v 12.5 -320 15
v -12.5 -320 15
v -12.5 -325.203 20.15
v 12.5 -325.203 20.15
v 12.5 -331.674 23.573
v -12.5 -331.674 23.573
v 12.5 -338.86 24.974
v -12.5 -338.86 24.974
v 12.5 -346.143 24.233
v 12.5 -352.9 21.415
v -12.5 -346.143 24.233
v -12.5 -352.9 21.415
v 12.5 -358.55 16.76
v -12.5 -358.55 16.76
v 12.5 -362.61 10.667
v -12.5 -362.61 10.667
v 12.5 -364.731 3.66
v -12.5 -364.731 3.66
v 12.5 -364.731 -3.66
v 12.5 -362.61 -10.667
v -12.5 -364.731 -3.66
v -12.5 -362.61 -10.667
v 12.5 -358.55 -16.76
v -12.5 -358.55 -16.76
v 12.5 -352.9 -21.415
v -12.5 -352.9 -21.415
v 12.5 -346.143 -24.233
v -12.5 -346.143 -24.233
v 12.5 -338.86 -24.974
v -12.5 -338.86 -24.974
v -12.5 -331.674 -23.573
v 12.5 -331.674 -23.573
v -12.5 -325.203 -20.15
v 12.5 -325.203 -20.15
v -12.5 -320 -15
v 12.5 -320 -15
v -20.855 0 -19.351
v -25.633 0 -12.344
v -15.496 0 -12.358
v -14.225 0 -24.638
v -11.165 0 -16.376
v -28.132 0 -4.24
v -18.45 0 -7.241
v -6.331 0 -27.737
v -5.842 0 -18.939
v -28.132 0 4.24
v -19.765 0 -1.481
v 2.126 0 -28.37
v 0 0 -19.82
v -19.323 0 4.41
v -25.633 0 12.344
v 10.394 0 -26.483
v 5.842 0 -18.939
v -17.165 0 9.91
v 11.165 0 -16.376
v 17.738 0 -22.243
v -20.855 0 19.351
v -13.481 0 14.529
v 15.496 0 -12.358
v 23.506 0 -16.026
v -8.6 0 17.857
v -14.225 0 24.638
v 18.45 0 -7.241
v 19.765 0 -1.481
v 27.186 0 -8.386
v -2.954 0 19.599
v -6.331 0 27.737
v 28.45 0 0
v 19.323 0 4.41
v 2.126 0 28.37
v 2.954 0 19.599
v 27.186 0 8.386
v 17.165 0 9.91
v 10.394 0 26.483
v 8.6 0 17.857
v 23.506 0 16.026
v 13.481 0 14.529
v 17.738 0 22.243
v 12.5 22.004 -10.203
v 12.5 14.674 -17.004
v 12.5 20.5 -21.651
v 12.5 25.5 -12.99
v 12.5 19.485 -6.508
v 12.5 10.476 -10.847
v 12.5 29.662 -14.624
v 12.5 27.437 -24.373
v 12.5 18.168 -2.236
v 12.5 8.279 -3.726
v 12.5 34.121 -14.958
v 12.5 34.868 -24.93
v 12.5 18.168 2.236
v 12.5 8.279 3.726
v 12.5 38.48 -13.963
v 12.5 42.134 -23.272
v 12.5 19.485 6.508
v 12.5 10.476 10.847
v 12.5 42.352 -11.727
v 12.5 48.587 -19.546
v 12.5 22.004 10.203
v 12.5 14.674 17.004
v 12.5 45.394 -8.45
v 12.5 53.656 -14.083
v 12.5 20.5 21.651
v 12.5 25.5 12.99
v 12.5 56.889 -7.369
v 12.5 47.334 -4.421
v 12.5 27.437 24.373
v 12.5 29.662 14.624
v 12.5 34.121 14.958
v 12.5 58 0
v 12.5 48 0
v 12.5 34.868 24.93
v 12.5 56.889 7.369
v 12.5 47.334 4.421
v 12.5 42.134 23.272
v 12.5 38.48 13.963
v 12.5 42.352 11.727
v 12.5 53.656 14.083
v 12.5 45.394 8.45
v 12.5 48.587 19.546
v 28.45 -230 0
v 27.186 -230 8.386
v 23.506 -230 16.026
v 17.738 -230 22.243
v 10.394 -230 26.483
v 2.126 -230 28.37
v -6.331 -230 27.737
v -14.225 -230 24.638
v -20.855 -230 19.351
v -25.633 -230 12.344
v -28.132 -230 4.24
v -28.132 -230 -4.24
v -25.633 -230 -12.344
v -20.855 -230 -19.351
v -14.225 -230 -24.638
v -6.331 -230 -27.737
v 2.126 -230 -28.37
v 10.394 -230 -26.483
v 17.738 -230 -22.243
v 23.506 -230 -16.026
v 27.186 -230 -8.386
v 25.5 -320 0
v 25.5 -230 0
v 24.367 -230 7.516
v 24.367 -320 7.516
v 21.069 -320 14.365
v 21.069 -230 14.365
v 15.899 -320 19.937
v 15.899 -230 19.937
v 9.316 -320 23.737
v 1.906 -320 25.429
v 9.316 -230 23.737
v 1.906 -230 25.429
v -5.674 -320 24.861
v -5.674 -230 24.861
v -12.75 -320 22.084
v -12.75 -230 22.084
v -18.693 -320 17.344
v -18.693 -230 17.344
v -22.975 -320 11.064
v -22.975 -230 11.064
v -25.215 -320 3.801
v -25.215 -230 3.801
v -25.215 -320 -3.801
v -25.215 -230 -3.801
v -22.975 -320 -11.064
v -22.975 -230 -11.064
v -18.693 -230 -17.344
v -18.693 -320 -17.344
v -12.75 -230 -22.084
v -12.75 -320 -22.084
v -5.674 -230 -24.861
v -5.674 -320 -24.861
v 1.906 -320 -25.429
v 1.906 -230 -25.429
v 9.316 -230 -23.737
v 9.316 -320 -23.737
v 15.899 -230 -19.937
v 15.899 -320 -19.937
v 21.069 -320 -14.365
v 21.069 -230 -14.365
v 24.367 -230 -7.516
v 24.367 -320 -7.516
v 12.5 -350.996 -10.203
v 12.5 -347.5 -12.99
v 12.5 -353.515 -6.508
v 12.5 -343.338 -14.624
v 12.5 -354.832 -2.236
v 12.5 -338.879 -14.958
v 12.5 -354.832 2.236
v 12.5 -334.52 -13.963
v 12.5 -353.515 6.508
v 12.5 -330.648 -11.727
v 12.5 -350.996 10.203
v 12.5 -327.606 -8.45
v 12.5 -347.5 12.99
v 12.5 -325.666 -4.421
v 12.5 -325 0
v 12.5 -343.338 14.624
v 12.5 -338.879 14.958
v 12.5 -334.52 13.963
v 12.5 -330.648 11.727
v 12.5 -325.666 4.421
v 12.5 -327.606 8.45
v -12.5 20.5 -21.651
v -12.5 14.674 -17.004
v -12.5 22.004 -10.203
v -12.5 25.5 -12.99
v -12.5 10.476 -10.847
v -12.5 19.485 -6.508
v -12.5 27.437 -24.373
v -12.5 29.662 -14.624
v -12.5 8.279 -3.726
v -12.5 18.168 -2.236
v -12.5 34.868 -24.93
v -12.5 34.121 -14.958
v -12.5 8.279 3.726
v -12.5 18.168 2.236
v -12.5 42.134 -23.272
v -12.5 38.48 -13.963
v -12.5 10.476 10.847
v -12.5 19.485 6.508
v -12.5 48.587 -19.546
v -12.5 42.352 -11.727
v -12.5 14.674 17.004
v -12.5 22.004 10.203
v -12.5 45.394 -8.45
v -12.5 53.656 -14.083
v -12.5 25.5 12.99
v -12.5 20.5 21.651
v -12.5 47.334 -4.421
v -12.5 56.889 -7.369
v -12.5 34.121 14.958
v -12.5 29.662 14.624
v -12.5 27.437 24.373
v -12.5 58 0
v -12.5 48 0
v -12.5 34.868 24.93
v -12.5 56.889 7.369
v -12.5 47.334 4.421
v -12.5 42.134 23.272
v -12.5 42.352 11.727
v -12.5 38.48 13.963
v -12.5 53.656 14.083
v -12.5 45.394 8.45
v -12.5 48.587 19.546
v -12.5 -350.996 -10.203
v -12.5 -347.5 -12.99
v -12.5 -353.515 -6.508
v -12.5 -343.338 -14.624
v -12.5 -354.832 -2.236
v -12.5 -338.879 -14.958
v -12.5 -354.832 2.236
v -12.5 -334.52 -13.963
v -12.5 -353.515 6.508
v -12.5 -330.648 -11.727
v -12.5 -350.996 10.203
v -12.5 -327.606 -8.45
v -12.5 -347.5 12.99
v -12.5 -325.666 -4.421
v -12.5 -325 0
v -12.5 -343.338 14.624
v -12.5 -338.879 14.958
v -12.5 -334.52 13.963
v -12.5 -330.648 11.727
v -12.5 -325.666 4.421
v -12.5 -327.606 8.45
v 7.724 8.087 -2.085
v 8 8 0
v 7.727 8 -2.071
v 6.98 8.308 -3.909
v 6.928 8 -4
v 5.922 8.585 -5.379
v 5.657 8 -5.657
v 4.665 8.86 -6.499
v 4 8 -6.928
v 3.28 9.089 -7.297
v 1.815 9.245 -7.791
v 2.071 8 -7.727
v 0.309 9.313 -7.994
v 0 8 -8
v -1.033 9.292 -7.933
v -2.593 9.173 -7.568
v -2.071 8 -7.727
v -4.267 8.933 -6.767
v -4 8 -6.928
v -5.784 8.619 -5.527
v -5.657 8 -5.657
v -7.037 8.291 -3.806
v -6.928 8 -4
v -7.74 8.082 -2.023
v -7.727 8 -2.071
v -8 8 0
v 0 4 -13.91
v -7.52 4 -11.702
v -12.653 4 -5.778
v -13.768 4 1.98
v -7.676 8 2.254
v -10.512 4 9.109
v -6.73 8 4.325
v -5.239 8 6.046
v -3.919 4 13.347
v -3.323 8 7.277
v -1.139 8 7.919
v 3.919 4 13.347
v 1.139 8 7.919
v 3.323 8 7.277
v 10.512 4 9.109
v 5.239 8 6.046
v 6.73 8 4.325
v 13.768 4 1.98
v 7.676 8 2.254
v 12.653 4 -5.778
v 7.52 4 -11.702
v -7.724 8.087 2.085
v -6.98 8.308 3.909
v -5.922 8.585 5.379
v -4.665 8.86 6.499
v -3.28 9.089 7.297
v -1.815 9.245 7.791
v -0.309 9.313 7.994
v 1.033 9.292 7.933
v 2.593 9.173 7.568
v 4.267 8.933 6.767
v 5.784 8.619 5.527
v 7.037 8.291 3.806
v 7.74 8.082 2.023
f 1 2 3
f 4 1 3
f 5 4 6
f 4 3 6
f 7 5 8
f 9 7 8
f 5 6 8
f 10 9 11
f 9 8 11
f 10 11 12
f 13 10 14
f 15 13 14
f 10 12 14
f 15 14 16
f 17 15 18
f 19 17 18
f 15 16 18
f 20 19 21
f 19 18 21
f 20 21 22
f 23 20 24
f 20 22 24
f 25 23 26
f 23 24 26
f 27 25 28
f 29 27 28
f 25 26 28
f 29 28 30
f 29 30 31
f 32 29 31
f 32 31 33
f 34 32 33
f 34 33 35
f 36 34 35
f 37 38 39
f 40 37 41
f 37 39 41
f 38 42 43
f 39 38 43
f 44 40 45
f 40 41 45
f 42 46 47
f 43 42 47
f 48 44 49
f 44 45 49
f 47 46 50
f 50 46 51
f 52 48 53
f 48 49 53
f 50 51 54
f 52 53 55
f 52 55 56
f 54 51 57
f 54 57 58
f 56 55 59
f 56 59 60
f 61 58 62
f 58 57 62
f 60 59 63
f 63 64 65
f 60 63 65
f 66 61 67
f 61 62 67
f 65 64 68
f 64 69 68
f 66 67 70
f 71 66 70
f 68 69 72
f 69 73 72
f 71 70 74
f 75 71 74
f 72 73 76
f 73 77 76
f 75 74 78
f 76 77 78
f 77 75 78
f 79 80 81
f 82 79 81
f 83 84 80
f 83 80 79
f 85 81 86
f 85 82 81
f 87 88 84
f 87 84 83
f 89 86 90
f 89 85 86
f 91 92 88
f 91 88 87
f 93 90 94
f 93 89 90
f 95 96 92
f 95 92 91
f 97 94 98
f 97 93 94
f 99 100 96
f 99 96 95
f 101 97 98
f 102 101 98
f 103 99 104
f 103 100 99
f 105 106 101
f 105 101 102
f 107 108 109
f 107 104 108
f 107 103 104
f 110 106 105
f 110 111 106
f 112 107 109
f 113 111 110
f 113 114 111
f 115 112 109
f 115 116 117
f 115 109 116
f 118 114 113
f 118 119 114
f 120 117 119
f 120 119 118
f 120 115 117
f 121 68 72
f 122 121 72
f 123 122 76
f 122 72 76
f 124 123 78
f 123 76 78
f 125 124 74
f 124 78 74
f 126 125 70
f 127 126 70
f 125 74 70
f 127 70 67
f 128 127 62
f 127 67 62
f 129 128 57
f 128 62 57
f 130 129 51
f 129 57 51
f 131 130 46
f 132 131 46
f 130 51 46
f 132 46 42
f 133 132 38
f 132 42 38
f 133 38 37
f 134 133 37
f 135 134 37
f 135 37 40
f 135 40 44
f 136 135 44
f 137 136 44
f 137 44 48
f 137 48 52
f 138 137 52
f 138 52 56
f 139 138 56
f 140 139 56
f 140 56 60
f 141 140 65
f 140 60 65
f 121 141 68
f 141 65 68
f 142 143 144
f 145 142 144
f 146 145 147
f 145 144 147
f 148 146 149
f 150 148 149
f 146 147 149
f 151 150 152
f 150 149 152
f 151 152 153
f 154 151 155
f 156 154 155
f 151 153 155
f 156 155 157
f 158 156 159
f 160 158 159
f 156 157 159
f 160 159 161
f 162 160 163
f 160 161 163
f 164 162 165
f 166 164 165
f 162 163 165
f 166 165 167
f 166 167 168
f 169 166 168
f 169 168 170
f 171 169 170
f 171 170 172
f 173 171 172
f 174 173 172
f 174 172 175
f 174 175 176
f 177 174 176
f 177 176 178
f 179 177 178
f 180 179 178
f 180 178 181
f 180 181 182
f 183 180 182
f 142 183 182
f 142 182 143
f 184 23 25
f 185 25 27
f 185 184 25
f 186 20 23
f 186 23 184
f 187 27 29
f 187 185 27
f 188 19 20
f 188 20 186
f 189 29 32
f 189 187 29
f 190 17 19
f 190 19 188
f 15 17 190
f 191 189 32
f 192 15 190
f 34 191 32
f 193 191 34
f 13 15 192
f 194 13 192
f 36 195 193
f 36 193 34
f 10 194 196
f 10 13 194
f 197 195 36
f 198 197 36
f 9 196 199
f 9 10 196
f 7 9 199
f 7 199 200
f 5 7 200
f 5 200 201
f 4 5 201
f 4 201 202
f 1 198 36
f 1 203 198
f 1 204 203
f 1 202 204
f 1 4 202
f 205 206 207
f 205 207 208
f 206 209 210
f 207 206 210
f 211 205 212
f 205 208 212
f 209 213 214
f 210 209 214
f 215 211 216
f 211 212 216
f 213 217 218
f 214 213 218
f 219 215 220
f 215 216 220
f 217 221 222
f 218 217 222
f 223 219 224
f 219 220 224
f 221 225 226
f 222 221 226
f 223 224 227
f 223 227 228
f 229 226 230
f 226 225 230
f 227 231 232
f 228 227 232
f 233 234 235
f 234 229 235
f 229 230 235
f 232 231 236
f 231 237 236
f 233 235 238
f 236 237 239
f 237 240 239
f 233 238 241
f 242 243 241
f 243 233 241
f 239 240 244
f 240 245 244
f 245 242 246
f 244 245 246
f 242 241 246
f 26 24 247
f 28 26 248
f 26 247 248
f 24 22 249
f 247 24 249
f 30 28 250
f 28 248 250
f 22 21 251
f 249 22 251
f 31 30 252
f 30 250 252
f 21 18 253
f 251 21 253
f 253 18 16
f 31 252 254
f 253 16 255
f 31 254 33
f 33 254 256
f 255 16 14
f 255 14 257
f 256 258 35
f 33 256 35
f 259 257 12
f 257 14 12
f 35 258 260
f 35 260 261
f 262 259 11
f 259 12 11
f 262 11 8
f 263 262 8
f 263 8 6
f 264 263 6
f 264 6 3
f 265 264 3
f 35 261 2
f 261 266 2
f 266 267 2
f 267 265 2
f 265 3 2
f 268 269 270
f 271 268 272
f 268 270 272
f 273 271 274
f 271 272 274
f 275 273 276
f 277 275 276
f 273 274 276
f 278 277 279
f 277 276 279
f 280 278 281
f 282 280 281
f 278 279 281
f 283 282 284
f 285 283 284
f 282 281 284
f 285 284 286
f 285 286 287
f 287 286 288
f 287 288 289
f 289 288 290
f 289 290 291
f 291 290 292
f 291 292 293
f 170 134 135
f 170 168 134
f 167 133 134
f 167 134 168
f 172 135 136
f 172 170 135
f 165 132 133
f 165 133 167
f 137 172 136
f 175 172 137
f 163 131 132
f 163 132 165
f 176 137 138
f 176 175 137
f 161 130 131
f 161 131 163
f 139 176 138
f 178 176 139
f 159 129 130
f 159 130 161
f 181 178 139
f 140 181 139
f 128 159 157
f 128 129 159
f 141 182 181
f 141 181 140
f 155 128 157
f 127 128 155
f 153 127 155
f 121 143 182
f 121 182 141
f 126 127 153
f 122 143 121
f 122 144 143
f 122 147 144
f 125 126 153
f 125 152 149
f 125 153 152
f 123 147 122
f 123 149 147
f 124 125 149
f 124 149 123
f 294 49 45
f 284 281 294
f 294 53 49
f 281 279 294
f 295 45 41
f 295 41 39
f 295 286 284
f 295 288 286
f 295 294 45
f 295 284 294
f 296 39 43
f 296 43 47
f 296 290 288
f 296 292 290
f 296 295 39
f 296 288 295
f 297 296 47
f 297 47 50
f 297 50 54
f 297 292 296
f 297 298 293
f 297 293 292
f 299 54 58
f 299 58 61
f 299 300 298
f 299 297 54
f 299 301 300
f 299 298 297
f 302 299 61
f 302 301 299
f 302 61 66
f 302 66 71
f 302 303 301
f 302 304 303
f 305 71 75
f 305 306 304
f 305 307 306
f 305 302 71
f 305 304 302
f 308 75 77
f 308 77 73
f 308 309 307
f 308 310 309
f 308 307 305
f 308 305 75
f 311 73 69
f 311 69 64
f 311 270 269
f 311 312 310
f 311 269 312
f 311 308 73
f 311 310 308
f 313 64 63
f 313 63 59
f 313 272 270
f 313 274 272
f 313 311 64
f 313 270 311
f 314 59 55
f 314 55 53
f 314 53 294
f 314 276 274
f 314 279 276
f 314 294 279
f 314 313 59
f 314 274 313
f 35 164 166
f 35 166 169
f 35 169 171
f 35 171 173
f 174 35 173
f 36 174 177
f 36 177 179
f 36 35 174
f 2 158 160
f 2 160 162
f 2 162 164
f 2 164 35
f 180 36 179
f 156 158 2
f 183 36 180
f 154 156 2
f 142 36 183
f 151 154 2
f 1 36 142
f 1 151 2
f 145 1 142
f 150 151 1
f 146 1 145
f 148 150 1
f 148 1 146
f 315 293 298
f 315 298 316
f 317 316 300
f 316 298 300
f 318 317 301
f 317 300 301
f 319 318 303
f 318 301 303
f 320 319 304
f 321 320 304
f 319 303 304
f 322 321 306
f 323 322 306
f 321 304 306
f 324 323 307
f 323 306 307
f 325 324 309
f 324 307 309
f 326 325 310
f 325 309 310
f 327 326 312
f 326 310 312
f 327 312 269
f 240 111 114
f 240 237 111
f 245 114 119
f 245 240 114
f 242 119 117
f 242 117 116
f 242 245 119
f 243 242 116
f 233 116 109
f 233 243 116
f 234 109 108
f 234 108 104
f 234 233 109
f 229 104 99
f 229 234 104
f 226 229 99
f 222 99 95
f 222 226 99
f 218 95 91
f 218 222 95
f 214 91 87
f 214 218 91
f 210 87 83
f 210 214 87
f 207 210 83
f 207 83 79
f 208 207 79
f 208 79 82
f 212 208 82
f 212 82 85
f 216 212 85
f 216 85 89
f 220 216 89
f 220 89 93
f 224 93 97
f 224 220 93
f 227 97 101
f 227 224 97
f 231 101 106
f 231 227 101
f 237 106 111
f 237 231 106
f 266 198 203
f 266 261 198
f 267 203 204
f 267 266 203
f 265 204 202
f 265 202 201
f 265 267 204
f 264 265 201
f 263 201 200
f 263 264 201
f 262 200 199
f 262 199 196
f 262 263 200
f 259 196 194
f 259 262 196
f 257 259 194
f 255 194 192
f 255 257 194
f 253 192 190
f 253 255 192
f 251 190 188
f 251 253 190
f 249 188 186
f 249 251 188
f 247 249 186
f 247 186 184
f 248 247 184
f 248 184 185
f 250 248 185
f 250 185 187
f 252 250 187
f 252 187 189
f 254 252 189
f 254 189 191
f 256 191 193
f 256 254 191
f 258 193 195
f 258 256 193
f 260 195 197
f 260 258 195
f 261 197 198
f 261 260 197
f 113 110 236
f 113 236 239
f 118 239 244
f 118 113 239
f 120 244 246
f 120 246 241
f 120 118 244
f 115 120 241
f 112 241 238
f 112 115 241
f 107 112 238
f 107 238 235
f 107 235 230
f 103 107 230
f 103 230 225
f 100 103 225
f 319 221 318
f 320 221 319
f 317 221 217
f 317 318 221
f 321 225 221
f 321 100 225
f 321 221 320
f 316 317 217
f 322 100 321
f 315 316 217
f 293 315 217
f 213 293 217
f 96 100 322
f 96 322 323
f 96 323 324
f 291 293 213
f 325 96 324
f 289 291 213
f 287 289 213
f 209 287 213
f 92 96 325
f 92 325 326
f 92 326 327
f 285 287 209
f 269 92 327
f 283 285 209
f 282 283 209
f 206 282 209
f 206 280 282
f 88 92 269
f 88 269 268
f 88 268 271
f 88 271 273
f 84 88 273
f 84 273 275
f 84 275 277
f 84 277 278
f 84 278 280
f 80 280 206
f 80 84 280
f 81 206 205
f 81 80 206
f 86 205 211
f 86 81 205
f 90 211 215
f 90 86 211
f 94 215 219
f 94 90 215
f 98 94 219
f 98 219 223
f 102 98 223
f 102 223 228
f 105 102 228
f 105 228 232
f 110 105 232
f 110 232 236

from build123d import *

# Parameters (mm, degrees)
F0_R      = 28.45
F1_DEPTH  = 230
F2_R      = 25.5
F3_DEPTH  = 90
F8_R      = 8
F9_DEPTH  = 5
F11_R     = 25
F11_R_2   = 15
F12_DEPTH = 12.5


with BuildPart() as f1:
    # F0 (on Front) → F1 (new body)
    with BuildSketch(Plane.XZ):
        Circle(F0_R)
    extrude(amount=F1_DEPTH)

    # F2 (on face) → F3 (join)
    with BuildSketch(Plane.XZ.offset(230)):
        Circle(F2_R)
    extrude(amount=F3_DEPTH)

    # F4 (on Right) → F5 (revolve)
    with BuildSketch(Plane.YZ):
        Polygon((-285, -21.45), (-285, 0), (-320, 0), (-320, -25.5), align=None)
    revolve(axis=Axis((0, -302.5, 0), (0, 1, 0)))

    # F6 (on Right) → F7 (revolve)
    with BuildSketch(Plane.YZ):
        Polygon((8, 0), (0, 0), (0, -19.82), (8, -8), align=None)
    revolve(axis=Axis((0, 4, 0), (0, 1, 0)))

    # F8 (on face) → F9 (join)
    with BuildSketch(Plane(origin=(0, 8, 0), x_dir=(-1, 0, 0), z_dir=(0, 1, 0))):
        Circle(F8_R)
    extrude(amount=F9_DEPTH)

    # F11 (on Right) → F12 (join, symmetric)
    with BuildSketch(Plane.YZ):
        with Locations((-340, 0)):
            Circle(F11_R)
        with Locations((-340, 0)):
            Circle(F11_R_2, mode=Mode.SUBTRACT)
        with Locations((33, 0)):
            Circle(F11_R)
        with Locations((33, 0)):
            Circle(F11_R_2, mode=Mode.SUBTRACT)
    extrude(amount=F12_DEPTH, both=True)


solid = f1.part
